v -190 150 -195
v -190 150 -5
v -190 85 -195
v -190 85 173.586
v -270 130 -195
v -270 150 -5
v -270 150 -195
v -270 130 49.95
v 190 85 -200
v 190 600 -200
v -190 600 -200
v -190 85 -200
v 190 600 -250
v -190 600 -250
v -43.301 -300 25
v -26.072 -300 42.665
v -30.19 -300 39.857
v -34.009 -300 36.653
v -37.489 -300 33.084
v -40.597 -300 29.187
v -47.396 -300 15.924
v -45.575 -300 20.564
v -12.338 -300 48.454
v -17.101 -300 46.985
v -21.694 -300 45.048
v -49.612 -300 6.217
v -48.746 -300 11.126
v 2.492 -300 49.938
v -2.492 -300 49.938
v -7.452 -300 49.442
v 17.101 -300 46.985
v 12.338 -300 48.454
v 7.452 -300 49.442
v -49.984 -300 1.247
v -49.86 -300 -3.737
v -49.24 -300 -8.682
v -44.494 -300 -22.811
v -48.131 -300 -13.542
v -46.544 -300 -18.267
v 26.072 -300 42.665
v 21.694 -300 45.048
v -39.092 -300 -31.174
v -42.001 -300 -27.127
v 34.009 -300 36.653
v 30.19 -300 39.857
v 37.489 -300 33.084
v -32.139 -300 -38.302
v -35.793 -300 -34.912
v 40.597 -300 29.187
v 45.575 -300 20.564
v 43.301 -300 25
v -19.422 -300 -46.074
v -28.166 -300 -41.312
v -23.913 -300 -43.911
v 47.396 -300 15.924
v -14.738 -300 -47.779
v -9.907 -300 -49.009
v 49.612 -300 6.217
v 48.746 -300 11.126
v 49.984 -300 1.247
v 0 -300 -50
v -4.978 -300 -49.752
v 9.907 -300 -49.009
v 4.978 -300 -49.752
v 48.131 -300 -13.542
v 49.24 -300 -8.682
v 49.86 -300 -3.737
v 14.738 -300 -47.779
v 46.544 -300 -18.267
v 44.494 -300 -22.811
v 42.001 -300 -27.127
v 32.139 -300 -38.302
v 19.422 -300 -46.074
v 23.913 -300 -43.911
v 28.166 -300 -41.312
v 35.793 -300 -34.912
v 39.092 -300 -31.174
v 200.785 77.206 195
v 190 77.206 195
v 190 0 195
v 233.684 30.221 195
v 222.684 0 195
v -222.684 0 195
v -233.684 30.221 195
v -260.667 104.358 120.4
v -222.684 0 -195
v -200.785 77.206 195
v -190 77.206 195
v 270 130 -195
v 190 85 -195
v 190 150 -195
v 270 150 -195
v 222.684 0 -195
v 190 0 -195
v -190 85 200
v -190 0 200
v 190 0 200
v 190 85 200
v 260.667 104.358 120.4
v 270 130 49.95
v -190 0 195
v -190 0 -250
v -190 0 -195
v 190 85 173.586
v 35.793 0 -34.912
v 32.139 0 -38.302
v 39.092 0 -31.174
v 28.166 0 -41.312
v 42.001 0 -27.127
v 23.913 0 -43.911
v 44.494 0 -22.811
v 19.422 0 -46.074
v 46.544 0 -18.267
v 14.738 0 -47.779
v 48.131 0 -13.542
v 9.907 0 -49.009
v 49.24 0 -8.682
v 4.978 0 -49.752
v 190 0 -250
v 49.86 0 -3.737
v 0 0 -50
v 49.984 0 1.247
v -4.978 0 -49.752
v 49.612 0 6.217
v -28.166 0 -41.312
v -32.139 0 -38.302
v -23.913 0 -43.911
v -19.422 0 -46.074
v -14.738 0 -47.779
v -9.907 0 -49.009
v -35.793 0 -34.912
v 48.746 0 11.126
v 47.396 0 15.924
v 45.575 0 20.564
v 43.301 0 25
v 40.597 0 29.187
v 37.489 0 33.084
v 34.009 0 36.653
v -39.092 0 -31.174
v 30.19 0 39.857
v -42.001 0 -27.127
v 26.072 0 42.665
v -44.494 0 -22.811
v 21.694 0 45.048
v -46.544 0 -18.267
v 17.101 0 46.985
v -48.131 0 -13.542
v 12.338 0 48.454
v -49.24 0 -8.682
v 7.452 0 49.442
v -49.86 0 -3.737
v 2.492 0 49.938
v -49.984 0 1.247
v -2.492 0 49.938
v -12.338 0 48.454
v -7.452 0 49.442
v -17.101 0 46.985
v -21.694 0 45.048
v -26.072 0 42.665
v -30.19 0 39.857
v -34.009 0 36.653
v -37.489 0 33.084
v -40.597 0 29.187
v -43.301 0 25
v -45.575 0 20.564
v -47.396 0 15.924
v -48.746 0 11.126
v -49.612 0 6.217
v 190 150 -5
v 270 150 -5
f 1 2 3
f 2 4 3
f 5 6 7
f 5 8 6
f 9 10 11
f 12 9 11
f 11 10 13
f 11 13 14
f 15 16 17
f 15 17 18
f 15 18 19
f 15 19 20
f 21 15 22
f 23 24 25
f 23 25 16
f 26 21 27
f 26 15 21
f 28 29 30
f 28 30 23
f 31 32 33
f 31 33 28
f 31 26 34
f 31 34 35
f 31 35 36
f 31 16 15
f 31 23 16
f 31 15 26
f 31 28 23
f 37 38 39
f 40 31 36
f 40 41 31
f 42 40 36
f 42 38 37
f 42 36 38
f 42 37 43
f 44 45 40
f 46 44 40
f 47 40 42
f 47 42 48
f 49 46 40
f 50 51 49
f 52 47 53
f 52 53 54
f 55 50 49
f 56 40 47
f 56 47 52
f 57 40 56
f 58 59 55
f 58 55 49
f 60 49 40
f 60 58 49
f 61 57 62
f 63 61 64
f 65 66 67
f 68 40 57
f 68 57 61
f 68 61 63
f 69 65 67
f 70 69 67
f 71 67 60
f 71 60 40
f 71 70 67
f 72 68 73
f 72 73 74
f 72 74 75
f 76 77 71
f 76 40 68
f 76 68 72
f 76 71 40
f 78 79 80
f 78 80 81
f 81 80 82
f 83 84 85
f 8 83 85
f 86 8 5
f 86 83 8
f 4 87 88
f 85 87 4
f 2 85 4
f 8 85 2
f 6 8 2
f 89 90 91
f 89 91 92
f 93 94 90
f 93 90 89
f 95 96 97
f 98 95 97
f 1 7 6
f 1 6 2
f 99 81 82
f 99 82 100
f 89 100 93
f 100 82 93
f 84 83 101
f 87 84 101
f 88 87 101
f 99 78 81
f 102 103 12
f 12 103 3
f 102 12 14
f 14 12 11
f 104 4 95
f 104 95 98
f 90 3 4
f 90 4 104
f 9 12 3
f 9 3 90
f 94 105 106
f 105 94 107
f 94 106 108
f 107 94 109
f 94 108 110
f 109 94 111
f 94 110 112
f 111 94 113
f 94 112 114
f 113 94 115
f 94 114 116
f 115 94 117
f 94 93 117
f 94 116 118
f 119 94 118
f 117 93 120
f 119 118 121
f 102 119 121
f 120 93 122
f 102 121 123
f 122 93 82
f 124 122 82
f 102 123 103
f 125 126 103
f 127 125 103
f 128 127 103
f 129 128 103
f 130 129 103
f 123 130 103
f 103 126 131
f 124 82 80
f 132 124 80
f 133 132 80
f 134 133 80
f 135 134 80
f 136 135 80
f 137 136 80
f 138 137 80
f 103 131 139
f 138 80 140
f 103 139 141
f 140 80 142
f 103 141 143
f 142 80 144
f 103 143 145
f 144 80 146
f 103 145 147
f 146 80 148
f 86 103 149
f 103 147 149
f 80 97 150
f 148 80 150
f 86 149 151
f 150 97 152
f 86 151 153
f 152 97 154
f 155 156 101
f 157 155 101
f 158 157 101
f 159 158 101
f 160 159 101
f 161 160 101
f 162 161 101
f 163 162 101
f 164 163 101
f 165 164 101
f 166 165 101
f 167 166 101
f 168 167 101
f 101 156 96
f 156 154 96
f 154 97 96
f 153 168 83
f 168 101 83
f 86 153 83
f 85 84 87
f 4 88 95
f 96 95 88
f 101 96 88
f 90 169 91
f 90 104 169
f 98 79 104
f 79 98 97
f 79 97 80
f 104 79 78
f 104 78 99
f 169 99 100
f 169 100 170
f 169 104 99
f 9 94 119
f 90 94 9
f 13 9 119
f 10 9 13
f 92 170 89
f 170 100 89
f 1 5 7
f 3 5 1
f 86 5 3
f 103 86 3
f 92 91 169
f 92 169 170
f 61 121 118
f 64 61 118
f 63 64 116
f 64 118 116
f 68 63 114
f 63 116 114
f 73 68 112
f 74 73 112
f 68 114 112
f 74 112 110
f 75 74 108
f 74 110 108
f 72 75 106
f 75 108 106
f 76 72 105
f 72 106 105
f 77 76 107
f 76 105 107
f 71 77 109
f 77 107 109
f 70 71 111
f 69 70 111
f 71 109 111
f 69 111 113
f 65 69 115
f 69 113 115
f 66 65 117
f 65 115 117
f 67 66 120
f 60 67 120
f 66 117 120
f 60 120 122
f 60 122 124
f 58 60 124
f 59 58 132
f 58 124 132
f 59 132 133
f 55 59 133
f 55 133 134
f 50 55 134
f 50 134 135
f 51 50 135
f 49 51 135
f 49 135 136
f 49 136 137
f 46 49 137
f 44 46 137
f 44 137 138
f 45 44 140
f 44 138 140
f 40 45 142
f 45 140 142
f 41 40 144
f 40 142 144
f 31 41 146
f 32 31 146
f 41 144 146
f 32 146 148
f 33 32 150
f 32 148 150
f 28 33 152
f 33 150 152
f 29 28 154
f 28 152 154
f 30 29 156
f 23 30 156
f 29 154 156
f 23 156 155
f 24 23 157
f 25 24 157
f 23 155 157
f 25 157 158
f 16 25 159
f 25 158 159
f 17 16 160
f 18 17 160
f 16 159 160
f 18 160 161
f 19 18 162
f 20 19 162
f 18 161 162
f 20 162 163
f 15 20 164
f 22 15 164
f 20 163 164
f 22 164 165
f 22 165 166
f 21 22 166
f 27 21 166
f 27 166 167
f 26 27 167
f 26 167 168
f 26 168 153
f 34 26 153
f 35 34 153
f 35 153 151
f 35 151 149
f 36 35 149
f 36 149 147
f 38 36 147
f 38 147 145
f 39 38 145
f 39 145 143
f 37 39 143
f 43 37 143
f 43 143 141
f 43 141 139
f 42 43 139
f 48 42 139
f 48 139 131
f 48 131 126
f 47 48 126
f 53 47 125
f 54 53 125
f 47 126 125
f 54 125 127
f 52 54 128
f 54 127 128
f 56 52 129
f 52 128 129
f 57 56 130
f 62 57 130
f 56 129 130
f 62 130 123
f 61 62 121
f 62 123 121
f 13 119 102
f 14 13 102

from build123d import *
from OCP.BRepFilletAPI import BRepFilletAPI_MakeChamfer

# Parameters (mm, degrees)
SKETCH1_W           = 380
SKETCH1_H           = 400
BOSS_EXTRUDE1_DEPTH = 85
SKETCH2_W           = 80
SKETCH2_H           = 390
BOSS_EXTRUDE2_DEPTH = 150
CHAMFER1_SIZE       = 72.794046853
CHAMFER1_SIZE_2     = 200
CHAMFER2_SIZE       = 130
CHAMFER2_SIZE2      = 47.316130455
SKETCH3_W           = 380
SKETCH3_H           = 600
BOSS_EXTRUDE3_DEPTH = 50
SKETCH4_R           = 50
BOSS_EXTRUDE4_DEPTH = 300
CHAMFER3_START      = 285.464373586
CHAMFER3_OUTLINE_W  = 79
CHAMFER3_OUTLINE_H  = 106
CHAMFER3_DEPTH      = 30.956619547
CHAMFER4_START      = -316.420993133
CHAMFER4_OUTLINE_W  = 79
CHAMFER4_OUTLINE_H  = 106
CHAMFER4_DEPTH      = 30.956619547


with BuildPart() as part:
    # Sketch1 → Boss-Extrude1 (new body)
    with BuildSketch(Plane(origin=(0, 0, 0), x_dir=(1, 0, 0), z_dir=(0, 1, 0))):
        Rectangle(SKETCH1_W, SKETCH1_H)
    extrude(amount=BOSS_EXTRUDE1_DEPTH)

    # Sketch2 → Boss-Extrude2 (add)
    with BuildSketch(Plane(origin=(0, 0, 0), x_dir=(1, 0, 0), z_dir=(0, 1, 0))):
        with Locations((-230, 0)):
            Rectangle(SKETCH2_W, SKETCH2_H)
        with Locations((230, 0)):
            Rectangle(SKETCH2_W, SKETCH2_H)
    extrude(amount=BOSS_EXTRUDE2_DEPTH)

    # Chamfer1
    # the kernel refuses this chamfer: 200, 72.794046853 mm, written as the material it takes off along each edge
    with BuildSketch(Plane(origin=(-788.83894651, 150, 195), x_dir=(0, -1, 0), z_dir=(1, 0, 0)), Plane(origin=(190, 150, 195), x_dir=(0, -1, 0), z_dir=(1, 0, 0))) as chamfer1_piece_1:
        Polygon((CHAMFER1_SIZE, 0), (0, CHAMFER1_SIZE_2), (0, 0), align=None)
    extrude(amount=598.83894651, mode=Mode.SUBTRACT)
    with BuildSketch(Plane(origin=(-788.83894651, 150, 195), x_dir=(0, -1, 0), z_dir=(1, 0, 0))) as chamfer1_piece_2_section:
        Polygon((CHAMFER1_SIZE, 0), (0, CHAMFER1_SIZE_2), (0, 0), align=None)
    chamfer1_piece_2 = extrude(amount=1117.67789302, mode=Mode.PRIVATE)
    chamfer1_piece_2 = split(chamfer1_piece_2, bisect_by=Plane(origin=(190, 150, 195), z_dir=(1, 0, 0)), keep=Keep.TOP, mode=Mode.PRIVATE)
    add(chamfer1_piece_2, mode=Mode.SUBTRACT)
    with BuildSketch(Plane(origin=(-328.83894651, 150, 195), x_dir=(0, -1, 0), z_dir=(1, 0, 0))) as chamfer1_piece_3_section:
        Polygon((CHAMFER1_SIZE, 0), (0, CHAMFER1_SIZE_2), (0, 0), align=None)
    chamfer1_piece_3 = extrude(amount=1117.67789302, mode=Mode.PRIVATE)
    chamfer1_piece_3 = split(chamfer1_piece_3, bisect_by=Plane(origin=(-190, 150, 195), z_dir=(-1, 0, 0)), keep=Keep.TOP, mode=Mode.PRIVATE)
    add(chamfer1_piece_3, mode=Mode.SUBTRACT)

    # Chamfer2: one chamfer whose edges measure the first distance from different faces: ONE call of the kernel's chamfer builder (chamfer() names one face for all edges)
    chamfer2_edges_1 = [part.edges().sort_by_distance(p)[0] for p in [
        (270, 0, 0),
    ]]
    chamfer2_side_1 = [part.faces().sort_by_distance(p)[0] for p in [
        (270, 67.789562339, -18.238567166),
    ]]
    chamfer2_edges_2 = [part.edges().sort_by_distance(p)[0] for p in [
        (-270, 0, 0),
    ]]
    chamfer2_side_2 = [part.faces().sort_by_distance(p)[0] for p in [
        (-270, 67.789562339, -18.238567166),
    ]]
    chamfer2 = BRepFilletAPI_MakeChamfer(part.part.solid().wrapped)
    for e in chamfer2_edges_1:
        chamfer2.Add(CHAMFER2_SIZE, CHAMFER2_SIZE2, e.wrapped, chamfer2_side_1[0].wrapped)  # the first distance lies on this face
    for e in chamfer2_edges_2:
        chamfer2.Add(CHAMFER2_SIZE, CHAMFER2_SIZE2, e.wrapped, chamfer2_side_2[0].wrapped)  # the first distance lies on this face
    add(Compound.cast(chamfer2.Shape()), mode=Mode.REPLACE)

    # Sketch3 → Boss-Extrude3 (add)
    with BuildSketch(Plane(origin=(0, 0, -200), x_dir=(-1, 0, 0), z_dir=(0, 0, -1))):
        with Locations((0, 300)):
            Rectangle(SKETCH3_W, SKETCH3_H)
    extrude(amount=BOSS_EXTRUDE3_DEPTH)

    # Sketch4 → Boss-Extrude4 (add)
    with BuildSketch(Plane.XZ):
        with Locations(Location((0, 0, 0), (0, 0, 270))):
            Circle(SKETCH4_R)
    extrude(amount=BOSS_EXTRUDE4_DEPTH)

    # Chamfer3: read off the stored shape, not the designer's step
    # Chamfer3 outline → Chamfer3 (cut)
    with BuildSketch(Plane(origin=(0, 0, 0), x_dir=(0.7852866244263759, -0.34179494272055927, -0.5162374789064406), z_dir=(0.6191323909286511, 0.433521167278043, 0.6547781914701)).offset(CHAMFER3_START)):
        with Locations((68.5, -31)):
            Rectangle(CHAMFER3_OUTLINE_W, CHAMFER3_OUTLINE_H)
    extrude(amount=CHAMFER3_DEPTH, mode=Mode.SUBTRACT)

    # Chamfer4: read off the stored shape, not the designer's step
    # Chamfer4 outline → Chamfer4 (cut)
    with BuildSketch(Plane(origin=(0, 0, 0), x_dir=(0.7852866244263759, 0.34179494272055927, 0.5162374789064406), z_dir=(0.6191323909286511, -0.433521167278043, -0.6547781914701)).offset(CHAMFER4_START)):
        with Locations((-68.5, 31)):
            Rectangle(CHAMFER4_OUTLINE_W, CHAMFER4_OUTLINE_H)
    extrude(amount=CHAMFER4_DEPTH, mode=Mode.SUBTRACT)


solid = part.part
